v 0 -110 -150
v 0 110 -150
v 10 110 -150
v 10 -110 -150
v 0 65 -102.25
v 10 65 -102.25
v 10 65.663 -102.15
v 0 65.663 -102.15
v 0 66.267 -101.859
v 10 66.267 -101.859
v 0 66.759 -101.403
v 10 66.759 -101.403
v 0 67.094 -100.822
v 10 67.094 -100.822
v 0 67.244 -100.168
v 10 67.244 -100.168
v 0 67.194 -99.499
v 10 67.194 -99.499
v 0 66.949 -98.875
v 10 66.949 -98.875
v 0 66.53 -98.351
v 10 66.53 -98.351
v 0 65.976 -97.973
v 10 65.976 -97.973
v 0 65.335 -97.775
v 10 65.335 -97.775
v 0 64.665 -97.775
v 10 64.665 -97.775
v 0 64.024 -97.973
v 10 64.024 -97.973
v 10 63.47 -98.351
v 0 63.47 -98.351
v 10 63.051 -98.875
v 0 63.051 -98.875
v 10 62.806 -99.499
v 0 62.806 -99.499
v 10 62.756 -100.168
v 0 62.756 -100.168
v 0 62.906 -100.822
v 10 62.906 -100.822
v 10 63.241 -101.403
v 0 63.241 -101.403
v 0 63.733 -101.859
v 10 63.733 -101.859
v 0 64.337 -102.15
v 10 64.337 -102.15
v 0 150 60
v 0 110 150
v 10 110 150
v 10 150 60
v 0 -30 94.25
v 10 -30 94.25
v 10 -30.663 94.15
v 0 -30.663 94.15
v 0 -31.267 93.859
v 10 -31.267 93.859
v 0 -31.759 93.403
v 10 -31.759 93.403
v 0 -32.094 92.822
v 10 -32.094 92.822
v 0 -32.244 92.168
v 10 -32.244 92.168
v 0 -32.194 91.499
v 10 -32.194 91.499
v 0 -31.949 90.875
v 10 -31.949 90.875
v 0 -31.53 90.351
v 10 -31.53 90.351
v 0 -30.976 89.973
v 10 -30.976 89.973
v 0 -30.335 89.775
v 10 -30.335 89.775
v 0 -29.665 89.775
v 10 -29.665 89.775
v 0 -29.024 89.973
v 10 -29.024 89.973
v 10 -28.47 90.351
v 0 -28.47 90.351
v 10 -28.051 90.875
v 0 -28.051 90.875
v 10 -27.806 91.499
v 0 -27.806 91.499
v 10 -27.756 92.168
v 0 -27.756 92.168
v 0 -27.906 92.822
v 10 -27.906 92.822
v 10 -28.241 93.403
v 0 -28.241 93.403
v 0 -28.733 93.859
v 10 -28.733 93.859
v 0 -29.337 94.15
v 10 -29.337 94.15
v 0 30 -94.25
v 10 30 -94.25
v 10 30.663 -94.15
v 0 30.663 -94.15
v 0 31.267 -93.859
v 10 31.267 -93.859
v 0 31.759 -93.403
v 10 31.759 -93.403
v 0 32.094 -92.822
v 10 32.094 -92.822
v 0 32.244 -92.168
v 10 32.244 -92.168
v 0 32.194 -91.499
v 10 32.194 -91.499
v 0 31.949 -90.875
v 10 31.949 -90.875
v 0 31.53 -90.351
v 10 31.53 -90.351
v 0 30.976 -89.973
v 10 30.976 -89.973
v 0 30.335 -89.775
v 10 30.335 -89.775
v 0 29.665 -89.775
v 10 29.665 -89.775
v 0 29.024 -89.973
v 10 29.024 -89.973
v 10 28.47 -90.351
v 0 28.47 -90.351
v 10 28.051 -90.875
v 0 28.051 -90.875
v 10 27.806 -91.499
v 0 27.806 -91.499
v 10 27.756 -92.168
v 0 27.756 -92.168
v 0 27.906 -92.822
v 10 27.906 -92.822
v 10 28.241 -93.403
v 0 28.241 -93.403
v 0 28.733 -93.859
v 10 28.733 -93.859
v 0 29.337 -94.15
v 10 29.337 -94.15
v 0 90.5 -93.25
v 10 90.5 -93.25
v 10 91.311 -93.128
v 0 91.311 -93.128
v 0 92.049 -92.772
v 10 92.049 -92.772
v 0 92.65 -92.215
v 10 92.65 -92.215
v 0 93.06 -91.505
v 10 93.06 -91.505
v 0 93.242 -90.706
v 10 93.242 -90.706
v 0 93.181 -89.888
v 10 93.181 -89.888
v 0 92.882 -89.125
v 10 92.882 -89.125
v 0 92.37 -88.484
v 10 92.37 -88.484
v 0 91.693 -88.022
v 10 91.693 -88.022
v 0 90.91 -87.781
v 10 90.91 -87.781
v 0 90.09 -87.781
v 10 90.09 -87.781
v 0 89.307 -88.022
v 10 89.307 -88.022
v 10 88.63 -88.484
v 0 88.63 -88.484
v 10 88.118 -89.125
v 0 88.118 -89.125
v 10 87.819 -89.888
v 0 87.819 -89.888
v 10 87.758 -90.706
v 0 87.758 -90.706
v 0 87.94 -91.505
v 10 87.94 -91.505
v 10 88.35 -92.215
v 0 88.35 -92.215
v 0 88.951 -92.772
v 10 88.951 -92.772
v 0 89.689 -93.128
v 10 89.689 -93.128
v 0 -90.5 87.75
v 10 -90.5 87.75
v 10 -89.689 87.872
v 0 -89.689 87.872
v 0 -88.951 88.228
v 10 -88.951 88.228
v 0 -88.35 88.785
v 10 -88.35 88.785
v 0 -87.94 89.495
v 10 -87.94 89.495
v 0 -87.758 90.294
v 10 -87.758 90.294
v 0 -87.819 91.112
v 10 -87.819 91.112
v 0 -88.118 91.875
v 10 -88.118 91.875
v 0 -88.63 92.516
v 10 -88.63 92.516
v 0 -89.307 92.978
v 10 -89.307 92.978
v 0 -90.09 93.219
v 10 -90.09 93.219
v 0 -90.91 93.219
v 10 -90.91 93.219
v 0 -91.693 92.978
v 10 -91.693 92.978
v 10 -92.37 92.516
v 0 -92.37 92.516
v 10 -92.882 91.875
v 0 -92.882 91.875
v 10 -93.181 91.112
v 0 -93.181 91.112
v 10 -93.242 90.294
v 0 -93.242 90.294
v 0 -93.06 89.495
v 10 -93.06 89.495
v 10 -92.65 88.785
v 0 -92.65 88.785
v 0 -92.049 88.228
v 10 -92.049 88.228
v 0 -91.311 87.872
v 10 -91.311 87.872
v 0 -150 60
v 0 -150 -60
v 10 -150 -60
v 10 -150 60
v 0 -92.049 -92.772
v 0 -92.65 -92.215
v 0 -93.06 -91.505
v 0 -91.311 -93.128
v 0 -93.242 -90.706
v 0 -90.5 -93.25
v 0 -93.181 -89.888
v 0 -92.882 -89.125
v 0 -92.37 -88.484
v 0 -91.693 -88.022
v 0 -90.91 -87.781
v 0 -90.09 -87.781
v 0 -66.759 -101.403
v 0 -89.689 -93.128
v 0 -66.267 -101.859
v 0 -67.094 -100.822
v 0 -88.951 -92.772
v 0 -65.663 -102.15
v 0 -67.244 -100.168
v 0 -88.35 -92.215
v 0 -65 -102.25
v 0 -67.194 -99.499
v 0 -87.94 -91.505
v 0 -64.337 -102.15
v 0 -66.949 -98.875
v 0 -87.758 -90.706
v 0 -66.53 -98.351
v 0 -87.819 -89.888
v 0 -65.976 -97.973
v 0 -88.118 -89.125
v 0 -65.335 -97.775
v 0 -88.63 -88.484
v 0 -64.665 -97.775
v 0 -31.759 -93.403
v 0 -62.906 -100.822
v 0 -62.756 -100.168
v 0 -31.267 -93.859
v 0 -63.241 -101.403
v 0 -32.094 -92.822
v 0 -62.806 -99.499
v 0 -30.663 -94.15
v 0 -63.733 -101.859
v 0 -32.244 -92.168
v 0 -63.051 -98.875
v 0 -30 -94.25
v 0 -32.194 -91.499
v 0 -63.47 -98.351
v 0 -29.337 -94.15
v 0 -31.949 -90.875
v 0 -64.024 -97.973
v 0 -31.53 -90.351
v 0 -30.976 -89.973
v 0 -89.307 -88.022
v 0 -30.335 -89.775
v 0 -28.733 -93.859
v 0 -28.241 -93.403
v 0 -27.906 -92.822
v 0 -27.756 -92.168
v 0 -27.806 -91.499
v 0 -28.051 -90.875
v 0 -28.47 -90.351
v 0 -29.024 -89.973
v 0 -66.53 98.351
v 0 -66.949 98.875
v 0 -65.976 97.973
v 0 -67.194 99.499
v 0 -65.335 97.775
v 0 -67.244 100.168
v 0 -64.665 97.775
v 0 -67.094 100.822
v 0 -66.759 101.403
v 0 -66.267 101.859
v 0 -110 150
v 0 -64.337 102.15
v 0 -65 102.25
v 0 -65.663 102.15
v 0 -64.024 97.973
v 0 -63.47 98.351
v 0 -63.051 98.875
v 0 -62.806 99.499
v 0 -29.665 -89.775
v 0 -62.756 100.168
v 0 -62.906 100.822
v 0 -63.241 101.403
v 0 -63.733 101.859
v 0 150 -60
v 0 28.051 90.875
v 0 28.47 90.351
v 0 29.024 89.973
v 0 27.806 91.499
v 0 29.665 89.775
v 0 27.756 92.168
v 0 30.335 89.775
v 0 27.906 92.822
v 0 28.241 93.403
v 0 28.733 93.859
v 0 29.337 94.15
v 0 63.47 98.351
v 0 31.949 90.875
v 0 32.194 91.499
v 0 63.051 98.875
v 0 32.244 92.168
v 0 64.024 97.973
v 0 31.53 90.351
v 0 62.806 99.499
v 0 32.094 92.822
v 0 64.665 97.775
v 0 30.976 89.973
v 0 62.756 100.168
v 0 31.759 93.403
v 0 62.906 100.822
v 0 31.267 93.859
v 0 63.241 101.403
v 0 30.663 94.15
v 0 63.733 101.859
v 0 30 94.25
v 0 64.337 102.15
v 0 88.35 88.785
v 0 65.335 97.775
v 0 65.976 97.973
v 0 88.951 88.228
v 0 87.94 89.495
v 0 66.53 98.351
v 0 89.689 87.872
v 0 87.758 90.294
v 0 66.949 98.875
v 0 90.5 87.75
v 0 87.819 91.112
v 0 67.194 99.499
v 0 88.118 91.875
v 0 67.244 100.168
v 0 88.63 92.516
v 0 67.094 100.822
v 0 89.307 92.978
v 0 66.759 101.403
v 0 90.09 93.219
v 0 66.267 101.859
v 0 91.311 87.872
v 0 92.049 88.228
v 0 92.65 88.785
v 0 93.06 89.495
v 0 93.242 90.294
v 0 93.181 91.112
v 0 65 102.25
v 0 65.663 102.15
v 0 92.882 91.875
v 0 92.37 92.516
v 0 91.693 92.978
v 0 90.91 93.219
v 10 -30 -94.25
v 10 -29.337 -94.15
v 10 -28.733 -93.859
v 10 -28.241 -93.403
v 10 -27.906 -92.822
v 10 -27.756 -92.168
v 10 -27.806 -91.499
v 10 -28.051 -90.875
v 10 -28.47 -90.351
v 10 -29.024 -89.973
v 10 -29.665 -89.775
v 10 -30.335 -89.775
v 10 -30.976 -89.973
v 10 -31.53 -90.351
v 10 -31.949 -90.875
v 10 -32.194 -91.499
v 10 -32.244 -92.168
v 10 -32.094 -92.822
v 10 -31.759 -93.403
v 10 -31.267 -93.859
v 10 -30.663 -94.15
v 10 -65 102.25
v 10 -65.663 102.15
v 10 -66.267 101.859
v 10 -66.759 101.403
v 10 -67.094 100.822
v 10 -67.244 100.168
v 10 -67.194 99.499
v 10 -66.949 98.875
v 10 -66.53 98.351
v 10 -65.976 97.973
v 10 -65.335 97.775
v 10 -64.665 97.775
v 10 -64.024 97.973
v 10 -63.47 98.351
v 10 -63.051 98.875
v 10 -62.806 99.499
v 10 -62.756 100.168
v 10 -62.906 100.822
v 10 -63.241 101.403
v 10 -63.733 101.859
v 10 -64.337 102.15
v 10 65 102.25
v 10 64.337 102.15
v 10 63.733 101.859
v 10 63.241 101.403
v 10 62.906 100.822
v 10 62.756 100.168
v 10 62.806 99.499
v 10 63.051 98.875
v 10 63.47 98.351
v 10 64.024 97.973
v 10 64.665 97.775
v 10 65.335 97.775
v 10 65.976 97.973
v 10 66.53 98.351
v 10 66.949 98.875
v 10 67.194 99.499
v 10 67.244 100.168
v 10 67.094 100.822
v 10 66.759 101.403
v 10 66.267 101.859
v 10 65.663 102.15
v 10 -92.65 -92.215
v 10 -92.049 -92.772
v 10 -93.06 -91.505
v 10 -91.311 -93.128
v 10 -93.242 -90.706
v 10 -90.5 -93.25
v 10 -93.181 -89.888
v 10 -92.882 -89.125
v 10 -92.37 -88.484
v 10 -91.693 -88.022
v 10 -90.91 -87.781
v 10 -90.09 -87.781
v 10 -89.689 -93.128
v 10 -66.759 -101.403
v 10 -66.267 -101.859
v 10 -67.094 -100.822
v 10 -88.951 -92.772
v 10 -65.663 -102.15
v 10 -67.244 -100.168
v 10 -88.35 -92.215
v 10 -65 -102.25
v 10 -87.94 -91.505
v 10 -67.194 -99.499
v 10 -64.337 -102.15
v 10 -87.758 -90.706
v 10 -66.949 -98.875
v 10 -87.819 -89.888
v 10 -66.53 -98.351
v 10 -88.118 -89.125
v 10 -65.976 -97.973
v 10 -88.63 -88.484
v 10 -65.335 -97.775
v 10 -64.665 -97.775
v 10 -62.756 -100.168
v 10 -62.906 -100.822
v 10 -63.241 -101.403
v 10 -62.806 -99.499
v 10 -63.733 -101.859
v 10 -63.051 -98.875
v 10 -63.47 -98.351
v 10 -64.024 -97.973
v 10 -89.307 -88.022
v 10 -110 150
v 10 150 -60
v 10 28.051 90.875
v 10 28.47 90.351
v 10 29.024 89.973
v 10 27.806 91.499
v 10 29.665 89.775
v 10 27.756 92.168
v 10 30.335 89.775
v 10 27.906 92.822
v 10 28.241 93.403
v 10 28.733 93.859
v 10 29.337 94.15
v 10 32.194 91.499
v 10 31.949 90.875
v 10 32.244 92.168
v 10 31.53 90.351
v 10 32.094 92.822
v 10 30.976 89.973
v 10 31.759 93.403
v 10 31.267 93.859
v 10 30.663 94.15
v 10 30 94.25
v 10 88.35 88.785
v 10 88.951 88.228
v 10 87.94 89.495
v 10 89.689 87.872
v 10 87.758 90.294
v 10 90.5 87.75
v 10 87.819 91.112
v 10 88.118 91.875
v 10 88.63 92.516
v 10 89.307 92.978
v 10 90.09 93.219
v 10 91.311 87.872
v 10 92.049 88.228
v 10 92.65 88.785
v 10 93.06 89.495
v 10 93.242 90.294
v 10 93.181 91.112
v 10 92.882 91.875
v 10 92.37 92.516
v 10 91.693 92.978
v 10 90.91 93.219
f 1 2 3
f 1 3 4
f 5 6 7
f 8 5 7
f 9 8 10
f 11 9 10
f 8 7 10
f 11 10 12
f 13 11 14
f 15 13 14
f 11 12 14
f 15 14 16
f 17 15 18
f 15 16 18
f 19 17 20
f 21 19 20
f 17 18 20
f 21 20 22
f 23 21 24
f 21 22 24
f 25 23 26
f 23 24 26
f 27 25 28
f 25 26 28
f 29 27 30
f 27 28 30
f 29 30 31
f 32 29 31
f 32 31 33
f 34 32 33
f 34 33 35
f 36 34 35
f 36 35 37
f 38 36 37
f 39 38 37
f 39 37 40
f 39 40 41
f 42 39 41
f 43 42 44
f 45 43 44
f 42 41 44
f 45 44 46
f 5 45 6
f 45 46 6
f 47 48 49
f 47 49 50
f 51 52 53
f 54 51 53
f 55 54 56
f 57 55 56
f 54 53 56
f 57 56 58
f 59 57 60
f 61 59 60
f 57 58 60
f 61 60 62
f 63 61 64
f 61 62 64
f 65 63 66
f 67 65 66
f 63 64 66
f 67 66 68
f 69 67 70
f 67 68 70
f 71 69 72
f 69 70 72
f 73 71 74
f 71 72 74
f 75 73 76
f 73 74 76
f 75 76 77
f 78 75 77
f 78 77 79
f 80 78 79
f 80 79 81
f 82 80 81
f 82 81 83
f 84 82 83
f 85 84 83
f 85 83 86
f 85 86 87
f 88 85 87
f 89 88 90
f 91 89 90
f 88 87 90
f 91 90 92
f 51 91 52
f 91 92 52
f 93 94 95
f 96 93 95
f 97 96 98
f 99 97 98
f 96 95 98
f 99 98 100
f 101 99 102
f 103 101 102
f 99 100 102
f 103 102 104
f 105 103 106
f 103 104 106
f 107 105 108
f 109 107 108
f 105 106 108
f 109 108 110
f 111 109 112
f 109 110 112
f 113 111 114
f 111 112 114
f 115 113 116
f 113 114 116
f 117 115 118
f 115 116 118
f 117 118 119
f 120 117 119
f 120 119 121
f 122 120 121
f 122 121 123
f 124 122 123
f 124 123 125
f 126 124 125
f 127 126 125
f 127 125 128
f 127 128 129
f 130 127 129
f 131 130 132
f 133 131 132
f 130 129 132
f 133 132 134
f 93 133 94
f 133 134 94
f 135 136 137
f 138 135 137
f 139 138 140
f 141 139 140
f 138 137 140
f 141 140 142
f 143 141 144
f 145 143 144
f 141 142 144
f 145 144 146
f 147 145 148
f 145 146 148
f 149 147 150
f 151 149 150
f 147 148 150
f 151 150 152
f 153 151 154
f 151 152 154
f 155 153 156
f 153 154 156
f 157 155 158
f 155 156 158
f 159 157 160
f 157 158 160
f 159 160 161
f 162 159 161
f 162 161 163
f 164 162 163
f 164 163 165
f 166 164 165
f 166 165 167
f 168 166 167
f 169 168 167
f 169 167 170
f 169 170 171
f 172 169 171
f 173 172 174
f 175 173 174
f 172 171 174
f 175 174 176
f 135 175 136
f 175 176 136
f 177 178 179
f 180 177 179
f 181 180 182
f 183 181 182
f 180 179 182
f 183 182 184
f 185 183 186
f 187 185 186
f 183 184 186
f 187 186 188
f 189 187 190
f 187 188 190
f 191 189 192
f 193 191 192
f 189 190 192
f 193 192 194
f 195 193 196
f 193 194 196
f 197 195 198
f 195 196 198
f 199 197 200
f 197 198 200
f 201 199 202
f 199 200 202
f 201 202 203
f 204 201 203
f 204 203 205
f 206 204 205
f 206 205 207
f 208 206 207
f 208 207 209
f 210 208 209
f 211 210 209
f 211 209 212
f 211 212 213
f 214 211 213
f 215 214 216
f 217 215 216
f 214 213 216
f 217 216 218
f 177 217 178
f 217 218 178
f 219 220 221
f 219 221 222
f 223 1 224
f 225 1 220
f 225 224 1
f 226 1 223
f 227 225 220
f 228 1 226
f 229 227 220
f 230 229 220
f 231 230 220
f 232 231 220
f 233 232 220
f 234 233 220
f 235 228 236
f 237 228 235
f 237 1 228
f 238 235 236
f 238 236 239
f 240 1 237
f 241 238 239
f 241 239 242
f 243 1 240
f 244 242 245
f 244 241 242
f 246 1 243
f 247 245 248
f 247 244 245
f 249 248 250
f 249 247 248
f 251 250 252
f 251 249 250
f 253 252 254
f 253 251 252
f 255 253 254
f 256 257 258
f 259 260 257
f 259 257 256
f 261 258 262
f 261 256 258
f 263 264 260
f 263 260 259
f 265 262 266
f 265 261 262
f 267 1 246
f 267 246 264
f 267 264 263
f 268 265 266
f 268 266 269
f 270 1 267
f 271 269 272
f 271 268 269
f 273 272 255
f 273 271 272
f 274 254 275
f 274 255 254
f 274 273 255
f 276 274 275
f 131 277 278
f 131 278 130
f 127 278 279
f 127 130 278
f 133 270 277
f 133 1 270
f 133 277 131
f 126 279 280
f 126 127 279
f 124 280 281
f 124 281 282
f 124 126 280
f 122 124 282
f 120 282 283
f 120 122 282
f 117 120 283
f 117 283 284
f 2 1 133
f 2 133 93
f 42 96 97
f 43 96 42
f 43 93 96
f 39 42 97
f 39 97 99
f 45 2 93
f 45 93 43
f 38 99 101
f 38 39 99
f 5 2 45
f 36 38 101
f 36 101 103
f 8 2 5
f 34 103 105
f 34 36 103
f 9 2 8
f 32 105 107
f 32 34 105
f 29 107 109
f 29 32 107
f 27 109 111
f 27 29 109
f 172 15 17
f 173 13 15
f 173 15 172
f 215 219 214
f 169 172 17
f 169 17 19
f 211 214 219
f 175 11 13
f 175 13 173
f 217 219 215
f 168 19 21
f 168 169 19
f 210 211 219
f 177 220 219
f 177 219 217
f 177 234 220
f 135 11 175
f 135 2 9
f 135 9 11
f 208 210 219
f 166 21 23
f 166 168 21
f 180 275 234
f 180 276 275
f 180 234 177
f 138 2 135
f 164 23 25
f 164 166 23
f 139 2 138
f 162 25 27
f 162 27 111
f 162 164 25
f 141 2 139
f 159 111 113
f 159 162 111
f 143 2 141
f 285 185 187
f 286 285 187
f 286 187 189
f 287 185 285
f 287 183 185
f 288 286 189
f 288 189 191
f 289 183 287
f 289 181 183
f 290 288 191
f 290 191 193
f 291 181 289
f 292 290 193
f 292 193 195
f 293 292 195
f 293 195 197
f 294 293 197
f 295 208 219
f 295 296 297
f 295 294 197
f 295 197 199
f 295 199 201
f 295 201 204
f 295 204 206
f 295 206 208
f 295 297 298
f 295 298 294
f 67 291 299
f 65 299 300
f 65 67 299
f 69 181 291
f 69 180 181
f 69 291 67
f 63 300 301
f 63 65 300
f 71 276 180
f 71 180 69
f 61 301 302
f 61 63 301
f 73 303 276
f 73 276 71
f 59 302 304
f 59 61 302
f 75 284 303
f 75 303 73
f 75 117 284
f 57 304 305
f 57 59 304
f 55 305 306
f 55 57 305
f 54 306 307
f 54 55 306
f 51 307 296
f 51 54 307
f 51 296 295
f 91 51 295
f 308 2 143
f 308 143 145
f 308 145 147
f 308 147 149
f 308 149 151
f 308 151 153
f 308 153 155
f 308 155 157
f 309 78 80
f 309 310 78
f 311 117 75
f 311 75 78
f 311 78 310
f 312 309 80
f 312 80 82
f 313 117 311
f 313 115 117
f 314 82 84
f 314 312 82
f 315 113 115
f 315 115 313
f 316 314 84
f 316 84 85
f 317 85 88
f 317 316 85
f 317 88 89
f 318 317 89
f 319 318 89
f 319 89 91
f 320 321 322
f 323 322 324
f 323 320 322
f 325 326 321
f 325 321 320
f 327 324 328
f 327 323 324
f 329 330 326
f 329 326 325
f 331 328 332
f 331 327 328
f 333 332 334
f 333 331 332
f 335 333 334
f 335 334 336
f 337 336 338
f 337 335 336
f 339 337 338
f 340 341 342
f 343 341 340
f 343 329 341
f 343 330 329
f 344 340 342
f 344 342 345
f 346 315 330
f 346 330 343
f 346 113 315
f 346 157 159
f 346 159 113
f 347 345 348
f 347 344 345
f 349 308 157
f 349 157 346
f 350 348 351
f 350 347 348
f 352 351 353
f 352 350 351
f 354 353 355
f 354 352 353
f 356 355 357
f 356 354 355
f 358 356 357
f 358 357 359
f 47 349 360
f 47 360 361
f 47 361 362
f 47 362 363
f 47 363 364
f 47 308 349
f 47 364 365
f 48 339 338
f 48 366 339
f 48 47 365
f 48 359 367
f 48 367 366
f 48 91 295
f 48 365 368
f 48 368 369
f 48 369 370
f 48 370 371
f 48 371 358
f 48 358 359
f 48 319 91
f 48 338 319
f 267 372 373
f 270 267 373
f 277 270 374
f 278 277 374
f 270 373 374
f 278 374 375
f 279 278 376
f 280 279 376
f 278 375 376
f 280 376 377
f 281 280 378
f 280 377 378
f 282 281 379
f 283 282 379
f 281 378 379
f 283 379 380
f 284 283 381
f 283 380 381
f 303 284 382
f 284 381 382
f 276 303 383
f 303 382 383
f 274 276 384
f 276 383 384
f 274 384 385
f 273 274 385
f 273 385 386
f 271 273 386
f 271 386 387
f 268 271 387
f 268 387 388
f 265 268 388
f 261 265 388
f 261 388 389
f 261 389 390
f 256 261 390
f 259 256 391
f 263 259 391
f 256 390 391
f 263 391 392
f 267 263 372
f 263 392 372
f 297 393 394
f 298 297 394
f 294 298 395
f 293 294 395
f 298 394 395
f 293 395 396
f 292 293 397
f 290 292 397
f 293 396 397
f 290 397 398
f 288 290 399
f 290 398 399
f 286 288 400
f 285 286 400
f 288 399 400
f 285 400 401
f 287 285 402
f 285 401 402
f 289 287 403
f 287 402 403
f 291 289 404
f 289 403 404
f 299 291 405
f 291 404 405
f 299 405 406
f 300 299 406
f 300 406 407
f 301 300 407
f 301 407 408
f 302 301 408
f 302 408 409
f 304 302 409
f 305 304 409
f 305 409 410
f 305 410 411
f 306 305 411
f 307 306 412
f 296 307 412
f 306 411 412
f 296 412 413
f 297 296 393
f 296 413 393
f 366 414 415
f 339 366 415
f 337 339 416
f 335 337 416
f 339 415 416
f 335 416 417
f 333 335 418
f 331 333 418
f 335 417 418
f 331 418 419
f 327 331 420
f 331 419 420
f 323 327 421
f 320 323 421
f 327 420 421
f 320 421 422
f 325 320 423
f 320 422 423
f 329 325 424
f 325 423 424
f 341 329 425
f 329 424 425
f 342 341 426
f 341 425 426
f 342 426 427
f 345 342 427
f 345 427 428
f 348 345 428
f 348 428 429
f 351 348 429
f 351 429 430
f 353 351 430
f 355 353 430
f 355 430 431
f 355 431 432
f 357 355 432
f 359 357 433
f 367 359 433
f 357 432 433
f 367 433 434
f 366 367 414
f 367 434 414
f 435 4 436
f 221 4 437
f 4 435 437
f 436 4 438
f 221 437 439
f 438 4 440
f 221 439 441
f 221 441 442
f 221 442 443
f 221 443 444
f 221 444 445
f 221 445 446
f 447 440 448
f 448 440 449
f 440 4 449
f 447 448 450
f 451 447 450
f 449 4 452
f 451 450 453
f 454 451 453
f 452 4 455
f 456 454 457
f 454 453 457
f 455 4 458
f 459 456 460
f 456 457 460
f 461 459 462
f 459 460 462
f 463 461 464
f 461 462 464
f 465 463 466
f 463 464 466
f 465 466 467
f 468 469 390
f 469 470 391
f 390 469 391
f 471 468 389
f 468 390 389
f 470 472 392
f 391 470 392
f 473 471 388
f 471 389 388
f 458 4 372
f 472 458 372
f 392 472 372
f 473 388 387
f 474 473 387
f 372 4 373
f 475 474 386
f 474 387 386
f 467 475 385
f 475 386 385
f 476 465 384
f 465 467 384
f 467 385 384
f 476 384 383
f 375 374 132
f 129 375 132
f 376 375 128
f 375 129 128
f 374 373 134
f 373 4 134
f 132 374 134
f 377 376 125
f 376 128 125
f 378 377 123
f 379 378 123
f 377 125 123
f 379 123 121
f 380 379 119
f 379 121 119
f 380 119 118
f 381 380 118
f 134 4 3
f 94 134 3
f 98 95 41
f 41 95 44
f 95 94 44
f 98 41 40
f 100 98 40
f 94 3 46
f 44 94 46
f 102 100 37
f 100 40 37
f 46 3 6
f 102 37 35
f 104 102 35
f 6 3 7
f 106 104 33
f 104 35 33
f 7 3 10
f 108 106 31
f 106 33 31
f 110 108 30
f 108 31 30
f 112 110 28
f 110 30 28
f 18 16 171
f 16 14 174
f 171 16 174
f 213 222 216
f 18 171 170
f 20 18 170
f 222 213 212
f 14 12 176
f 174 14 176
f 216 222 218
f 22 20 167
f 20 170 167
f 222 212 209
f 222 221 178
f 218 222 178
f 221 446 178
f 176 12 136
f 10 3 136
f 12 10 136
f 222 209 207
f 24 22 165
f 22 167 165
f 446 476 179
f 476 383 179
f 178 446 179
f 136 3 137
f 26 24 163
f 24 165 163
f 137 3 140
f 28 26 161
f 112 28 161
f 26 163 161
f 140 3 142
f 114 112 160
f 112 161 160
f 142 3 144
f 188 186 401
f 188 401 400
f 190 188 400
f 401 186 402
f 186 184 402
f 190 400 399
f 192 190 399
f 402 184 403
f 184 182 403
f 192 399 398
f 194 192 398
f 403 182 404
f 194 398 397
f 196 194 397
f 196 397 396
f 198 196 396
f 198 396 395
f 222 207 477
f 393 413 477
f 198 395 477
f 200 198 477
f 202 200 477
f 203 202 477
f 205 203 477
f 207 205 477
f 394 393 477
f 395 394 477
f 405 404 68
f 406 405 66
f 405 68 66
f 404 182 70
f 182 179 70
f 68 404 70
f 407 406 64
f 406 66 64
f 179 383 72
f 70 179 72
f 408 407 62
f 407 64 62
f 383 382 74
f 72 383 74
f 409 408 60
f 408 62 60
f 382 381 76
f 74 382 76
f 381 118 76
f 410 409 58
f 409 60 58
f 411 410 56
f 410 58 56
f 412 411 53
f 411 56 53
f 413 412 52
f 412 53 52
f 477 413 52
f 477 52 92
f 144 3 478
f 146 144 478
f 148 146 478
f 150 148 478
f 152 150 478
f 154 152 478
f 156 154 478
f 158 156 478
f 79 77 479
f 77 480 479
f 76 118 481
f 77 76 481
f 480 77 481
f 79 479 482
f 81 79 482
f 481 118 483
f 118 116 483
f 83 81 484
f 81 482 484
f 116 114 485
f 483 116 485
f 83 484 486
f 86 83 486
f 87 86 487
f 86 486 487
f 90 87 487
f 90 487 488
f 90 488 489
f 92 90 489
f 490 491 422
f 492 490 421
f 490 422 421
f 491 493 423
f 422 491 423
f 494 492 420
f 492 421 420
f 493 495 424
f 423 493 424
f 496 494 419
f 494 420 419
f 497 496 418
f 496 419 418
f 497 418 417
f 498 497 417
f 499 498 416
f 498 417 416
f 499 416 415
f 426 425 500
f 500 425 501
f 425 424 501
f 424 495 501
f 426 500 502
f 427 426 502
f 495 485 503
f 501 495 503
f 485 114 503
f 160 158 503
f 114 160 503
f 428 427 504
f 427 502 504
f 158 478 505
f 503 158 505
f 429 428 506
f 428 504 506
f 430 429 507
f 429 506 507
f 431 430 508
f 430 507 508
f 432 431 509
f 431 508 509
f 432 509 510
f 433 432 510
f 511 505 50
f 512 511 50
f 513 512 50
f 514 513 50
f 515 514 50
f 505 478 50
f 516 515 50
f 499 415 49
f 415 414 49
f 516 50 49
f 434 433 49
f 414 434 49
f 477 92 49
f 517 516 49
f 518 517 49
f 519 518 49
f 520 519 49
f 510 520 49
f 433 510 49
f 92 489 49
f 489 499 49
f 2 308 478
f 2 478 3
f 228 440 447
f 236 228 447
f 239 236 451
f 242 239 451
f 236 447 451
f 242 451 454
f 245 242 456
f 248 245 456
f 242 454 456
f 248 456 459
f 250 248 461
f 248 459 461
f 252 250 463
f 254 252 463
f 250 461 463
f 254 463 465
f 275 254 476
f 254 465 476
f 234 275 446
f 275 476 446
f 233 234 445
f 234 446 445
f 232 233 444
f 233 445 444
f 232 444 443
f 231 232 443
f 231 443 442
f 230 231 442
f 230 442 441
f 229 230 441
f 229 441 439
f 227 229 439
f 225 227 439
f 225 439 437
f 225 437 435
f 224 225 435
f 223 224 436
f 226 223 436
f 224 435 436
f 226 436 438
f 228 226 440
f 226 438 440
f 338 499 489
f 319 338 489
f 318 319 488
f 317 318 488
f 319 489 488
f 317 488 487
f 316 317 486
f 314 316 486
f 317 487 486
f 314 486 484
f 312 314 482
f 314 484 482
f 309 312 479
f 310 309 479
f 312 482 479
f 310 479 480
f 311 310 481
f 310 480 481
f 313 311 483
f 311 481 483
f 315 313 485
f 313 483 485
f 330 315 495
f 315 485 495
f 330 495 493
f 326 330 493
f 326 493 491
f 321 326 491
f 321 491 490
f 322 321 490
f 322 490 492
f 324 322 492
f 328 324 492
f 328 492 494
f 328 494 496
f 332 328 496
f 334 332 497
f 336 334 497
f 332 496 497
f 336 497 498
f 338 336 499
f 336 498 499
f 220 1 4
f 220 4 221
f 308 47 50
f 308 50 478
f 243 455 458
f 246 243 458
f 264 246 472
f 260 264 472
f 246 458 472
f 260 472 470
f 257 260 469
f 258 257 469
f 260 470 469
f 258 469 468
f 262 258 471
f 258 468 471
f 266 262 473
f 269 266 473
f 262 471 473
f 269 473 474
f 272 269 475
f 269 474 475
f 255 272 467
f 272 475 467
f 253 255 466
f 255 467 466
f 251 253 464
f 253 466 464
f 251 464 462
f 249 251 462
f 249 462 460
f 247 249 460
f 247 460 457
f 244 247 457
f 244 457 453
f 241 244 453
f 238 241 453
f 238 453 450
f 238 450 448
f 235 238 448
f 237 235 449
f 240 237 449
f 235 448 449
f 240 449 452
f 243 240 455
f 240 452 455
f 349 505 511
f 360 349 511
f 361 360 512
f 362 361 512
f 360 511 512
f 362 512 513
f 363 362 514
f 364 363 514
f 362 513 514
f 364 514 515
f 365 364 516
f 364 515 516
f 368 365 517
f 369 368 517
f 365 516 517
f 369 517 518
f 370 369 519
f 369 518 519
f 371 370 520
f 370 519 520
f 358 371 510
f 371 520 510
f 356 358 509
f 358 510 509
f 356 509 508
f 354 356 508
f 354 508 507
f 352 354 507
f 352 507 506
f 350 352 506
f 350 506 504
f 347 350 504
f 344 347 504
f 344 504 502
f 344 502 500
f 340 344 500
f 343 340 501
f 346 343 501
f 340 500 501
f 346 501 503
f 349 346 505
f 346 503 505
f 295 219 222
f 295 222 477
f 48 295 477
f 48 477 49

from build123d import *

# Parameters (mm, degrees)
EXTRUDE_1_DEPTH     = 10
SKETCH_2_R          = 2.25
CUT_EXTRUDE_1_DEPTH = 10
SKETCH_3_R          = 2.75
CUT_EXTRUDE_2_DEPTH = 10


with BuildPart() as part:
    # 草图1 → 凸台-拉伸1 (new body)
    with BuildSketch(Plane(origin=(0, 0, 0), x_dir=(0, 0, -1), z_dir=(1, 0, 0))):
        Polygon((-150, -110), (-150, 110), (-60, 150), (60, 150), (150, 110), (150, -110), (60, -150), (-60, -150), align=None)
    extrude(amount=EXTRUDE_1_DEPTH)

    # 草图2 → 切除-拉伸1 (cut)
    with BuildSketch(Plane(origin=(10, 0, 0), x_dir=(0, 0, -1), z_dir=(1, 0, 0))):
        with Locations((92, 30)):
            Circle(SKETCH_2_R)
        with Locations((92, -30)):
            Circle(SKETCH_2_R)
        with Locations((100, 65)):
            Circle(SKETCH_2_R)
        with Locations((100, -65)):
            Circle(SKETCH_2_R)
        with Locations(Location((-100, -65, 0), (0, 0, 180))):
            Circle(SKETCH_2_R)
        with Locations(Location((-100, 65, 0), (0, 0, 180))):
            Circle(SKETCH_2_R)
        with Locations(Location((-92, -30, 0), (0, 0, 180))):
            Circle(SKETCH_2_R)
        with Locations(Location((-92, 30, 0), (0, 0, 180))):
            Circle(SKETCH_2_R)
    extrude(amount=-CUT_EXTRUDE_1_DEPTH, mode=Mode.SUBTRACT)

    # 草图3 → 切除-拉伸2 (cut)
    with BuildSketch(Plane(origin=(10, 0, 0), x_dir=(0, 0, -1), z_dir=(1, 0, 0))):
        with Locations((-90.5, 90.5)):
            Circle(SKETCH_3_R)
        with Locations((90.5, 90.5)):
            Circle(SKETCH_3_R)
        with Locations((-90.5, -90.5)):
            Circle(SKETCH_3_R)
        with Locations((90.5, -90.5)):
            Circle(SKETCH_3_R)
    extrude(amount=-CUT_EXTRUDE_2_DEPTH, mode=Mode.SUBTRACT)


solid = part.part
